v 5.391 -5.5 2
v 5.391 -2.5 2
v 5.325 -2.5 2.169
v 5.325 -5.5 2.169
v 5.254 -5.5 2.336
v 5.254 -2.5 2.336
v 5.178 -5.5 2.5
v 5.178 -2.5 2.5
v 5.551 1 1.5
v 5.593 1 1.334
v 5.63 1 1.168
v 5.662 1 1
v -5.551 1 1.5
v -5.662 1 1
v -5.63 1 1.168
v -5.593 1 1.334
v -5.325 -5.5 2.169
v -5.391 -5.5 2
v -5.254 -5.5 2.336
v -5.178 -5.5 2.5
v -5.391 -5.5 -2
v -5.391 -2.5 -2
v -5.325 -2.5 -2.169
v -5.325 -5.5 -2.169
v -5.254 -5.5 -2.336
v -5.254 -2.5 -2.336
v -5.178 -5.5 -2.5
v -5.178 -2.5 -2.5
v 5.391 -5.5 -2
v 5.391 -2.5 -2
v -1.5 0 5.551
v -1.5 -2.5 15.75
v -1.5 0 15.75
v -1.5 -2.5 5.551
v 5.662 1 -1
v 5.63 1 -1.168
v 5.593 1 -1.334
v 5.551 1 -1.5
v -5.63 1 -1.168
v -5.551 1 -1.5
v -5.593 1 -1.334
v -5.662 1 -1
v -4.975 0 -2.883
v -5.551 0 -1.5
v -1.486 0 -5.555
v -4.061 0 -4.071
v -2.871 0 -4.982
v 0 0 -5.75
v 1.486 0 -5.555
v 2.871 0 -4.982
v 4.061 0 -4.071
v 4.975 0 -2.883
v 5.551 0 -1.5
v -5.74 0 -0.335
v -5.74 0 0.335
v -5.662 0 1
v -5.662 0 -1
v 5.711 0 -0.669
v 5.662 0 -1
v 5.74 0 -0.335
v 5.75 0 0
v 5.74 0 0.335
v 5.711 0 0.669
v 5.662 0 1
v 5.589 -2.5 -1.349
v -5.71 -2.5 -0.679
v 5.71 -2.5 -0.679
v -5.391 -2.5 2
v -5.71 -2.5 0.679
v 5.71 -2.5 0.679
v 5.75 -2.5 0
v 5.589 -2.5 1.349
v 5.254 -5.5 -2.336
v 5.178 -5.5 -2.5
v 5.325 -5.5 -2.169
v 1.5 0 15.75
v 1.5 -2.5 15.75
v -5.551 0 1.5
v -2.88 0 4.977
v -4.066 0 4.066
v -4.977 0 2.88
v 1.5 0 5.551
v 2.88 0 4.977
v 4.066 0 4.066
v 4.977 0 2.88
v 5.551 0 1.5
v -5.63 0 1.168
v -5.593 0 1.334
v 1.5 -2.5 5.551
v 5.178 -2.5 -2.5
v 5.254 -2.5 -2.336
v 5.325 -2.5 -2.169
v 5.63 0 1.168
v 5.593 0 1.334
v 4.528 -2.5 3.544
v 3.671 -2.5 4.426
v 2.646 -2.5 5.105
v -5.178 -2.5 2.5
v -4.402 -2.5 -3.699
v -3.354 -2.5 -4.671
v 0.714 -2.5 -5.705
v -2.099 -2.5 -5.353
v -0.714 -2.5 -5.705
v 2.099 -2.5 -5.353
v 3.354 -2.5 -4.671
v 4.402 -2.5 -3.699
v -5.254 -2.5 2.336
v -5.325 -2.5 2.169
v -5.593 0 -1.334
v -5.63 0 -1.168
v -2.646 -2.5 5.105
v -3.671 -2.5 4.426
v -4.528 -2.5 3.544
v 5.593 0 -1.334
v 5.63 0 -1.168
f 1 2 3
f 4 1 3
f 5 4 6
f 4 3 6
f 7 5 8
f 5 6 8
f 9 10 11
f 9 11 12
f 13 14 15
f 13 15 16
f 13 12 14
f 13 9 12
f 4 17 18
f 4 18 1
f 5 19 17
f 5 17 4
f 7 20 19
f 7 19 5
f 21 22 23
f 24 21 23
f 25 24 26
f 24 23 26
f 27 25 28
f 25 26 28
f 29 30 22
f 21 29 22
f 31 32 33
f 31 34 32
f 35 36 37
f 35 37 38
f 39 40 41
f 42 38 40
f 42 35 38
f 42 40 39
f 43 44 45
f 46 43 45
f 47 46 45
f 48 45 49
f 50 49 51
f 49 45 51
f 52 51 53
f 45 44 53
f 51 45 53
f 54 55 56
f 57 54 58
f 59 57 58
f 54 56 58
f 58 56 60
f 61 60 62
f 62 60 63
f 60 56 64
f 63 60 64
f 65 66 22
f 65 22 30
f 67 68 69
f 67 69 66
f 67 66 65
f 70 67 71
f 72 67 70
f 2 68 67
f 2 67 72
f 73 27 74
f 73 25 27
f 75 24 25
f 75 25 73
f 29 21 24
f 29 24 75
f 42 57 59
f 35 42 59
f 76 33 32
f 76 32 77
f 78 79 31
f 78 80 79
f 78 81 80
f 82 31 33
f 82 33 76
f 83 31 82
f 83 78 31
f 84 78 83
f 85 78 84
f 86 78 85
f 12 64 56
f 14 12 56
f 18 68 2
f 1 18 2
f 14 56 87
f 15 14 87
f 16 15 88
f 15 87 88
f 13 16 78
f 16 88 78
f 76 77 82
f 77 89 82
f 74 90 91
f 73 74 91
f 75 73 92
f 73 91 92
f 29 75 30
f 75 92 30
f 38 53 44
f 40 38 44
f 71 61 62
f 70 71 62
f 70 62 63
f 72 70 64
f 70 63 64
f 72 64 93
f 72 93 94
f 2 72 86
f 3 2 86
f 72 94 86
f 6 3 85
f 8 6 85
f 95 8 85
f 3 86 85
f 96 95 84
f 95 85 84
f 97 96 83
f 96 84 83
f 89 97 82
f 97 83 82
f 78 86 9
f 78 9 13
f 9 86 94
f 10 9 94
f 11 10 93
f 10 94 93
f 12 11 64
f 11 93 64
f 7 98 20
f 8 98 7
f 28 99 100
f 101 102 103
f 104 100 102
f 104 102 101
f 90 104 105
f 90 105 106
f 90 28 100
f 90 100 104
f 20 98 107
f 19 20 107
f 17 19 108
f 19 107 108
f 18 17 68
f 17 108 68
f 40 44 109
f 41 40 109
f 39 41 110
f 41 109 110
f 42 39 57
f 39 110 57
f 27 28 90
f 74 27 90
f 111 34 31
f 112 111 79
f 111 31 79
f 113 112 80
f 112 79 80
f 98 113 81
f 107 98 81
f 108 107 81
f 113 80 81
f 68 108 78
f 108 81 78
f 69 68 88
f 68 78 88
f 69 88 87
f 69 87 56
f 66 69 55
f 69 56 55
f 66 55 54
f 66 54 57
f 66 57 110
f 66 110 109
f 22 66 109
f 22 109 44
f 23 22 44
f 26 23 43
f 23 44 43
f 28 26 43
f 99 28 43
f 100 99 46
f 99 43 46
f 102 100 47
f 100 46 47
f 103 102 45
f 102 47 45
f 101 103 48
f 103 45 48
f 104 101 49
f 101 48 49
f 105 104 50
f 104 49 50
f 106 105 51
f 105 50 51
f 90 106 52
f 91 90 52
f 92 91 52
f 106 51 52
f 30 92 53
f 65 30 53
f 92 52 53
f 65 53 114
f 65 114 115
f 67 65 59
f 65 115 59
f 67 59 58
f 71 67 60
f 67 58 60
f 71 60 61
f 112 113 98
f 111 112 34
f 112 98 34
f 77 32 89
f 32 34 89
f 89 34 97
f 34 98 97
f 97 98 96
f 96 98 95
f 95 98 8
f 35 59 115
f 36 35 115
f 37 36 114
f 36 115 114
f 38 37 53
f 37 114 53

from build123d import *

# Parameters (mm, degrees)
F1_DEPTH = 2.5
F2_W     = 10.3561575886
F2_H     = 0.5
F3_DEPTH = 3
F4_W     = 11.1018016556
F4_H     = 0.5
F5_DEPTH = 1
F6_DEPTH = 2.5
F7_W     = 3
F7_H     = 2.5
F8_DEPTH = 10


# Not quite as in the source:
# - after a boolean that leaves OpenCascade's solid faulty, fix() repairs it


with BuildPart() as f1:
    # F0 (on Front) → F1 (new body)
    with BuildSketch(Plane.XZ):
        with BuildLine():
            ThreePointArc((-1.5, 5.5509008278), (-3.4955328635, -4.5654955919), (5.75, 0))
            ThreePointArc((5.75, 0), (4.5654955919, 3.4955328635), (1.5, 5.5509008278))
            ThreePointArc((1.5, 5.5509008278), (0.7565779009, 5.7000078842), (0, 5.75))
            ThreePointArc((0, 5.75), (-0.7565779009, 5.7000078842), (-1.5, 5.5509008278))
        make_face()
    extrude(amount=F1_DEPTH)

    # F2 (on face) → F3 (join)
    with BuildSketch(Plane.XZ.offset(2.5)):
        with Locations((0, 2.25)):
            Rectangle(F2_W, F2_H)
        with Locations((0, -2.25)):
            Rectangle(F2_W, F2_H)
        with BuildLine():
            Line((5.1780787943, 2.5), (5.1780787943, 2))
            Line((5.1780787943, 2), (5.3909646632, 2))
            ThreePointArc((5.3909646632, 2), (5.2904319201, 2.2525163925), (5.1780787943, 2.5))
        make_face()
        with BuildLine():
            ThreePointArc((-5.1780787943, 2.5), (-5.2904319201, 2.2525163925), (-5.3909646632, 2))
            Line((-5.3909646632, 2), (-5.1780787943, 2))
            Line((-5.1780787943, 2), (-5.1780787943, 2.5))
        make_face()
        with BuildLine():
            Line((-5.1780787943, -2), (-5.3909646632, -2))
            ThreePointArc((-5.3909646632, -2), (-5.2904319201, -2.2525163925), (-5.1780787943, -2.5))
            Line((-5.1780787943, -2.5), (-5.1780787943, -2))
        make_face()
        with BuildLine():
            Line((5.3909646632, -2), (5.1780787943, -2))
            Line((5.1780787943, -2), (5.1780787943, -2.5))
            ThreePointArc((5.1780787943, -2.5), (5.2904319201, -2.2525163925), (5.3909646632, -2))
        make_face()
    extrude(amount=F3_DEPTH)

    # F4 (on face) → F5 (join)
    with BuildSketch(Plane(origin=(0, 0, 0), x_dir=(-1, 0, 0), z_dir=(0, 1, 0))):
        with Locations((0, 1.25)):
            Rectangle(F4_W, F4_H)
        with Locations((0, -1.25)):
            Rectangle(F4_W, F4_H)
        with BuildLine():
            Line((5.5509008278, 1.5), (5.5509008278, 1))
            Line((5.5509008278, 1), (5.6623758265, 1))
            ThreePointArc((5.6623758265, 1), (5.6122093093, 1.2512420505), (5.5509008278, 1.5))
        make_face()
        with BuildLine():
            Line((5.6623758265, -1), (5.5509008278, -1))
            Line((5.5509008278, -1), (5.5509008278, -1.5))
            ThreePointArc((5.5509008278, -1.5), (5.6122093093, -1.2512420505), (5.6623758265, -1))
        make_face()
        with BuildLine():
            Line((-5.5509008278, -1), (-5.6623758265, -1))
            ThreePointArc((-5.6623758265, -1), (-5.6122093093, -1.2512420505), (-5.5509008278, -1.5))
            Line((-5.5509008278, -1.5), (-5.5509008278, -1))
        make_face()
        with BuildLine():
            ThreePointArc((-5.5509008278, 1.5), (-5.6122093093, 1.2512420505), (-5.6623758265, 1))
            Line((-5.6623758265, 1), (-5.5509008278, 1))
            Line((-5.5509008278, 1), (-5.5509008278, 1.5))
        make_face()
    extrude(amount=F5_DEPTH)

    add(f1.part.fix(), mode=Mode.REPLACE)

    # F0 (on Front) → F6 (join)
    with BuildSketch(Plane.XZ):
        with BuildLine():
            ThreePointArc((0, 5.75), (0.7565779009, 5.7000078842), (1.5, 5.5509008278))
            Line((1.5, 5.5509008278), (1.5, 5.75))
            Line((1.5, 5.75), (0, 5.75))
        make_face()
        with BuildLine():
            Line((-1.5, 5.75), (-1.5, 5.5509008278))
            ThreePointArc((-1.5, 5.5509008278), (-0.7565779009, 5.7000078842), (0, 5.75))
            Line((0, 5.75), (-1.5, 5.75))
        make_face()
    extrude(amount=F6_DEPTH)

    # F7 (on face) → F8 (join)
    with BuildSketch(Plane.XY.offset(5.75)):
        with Locations((0, -1.25)):
            Rectangle(F7_W, F7_H)
    extrude(amount=F8_DEPTH)


solid = f1.part
